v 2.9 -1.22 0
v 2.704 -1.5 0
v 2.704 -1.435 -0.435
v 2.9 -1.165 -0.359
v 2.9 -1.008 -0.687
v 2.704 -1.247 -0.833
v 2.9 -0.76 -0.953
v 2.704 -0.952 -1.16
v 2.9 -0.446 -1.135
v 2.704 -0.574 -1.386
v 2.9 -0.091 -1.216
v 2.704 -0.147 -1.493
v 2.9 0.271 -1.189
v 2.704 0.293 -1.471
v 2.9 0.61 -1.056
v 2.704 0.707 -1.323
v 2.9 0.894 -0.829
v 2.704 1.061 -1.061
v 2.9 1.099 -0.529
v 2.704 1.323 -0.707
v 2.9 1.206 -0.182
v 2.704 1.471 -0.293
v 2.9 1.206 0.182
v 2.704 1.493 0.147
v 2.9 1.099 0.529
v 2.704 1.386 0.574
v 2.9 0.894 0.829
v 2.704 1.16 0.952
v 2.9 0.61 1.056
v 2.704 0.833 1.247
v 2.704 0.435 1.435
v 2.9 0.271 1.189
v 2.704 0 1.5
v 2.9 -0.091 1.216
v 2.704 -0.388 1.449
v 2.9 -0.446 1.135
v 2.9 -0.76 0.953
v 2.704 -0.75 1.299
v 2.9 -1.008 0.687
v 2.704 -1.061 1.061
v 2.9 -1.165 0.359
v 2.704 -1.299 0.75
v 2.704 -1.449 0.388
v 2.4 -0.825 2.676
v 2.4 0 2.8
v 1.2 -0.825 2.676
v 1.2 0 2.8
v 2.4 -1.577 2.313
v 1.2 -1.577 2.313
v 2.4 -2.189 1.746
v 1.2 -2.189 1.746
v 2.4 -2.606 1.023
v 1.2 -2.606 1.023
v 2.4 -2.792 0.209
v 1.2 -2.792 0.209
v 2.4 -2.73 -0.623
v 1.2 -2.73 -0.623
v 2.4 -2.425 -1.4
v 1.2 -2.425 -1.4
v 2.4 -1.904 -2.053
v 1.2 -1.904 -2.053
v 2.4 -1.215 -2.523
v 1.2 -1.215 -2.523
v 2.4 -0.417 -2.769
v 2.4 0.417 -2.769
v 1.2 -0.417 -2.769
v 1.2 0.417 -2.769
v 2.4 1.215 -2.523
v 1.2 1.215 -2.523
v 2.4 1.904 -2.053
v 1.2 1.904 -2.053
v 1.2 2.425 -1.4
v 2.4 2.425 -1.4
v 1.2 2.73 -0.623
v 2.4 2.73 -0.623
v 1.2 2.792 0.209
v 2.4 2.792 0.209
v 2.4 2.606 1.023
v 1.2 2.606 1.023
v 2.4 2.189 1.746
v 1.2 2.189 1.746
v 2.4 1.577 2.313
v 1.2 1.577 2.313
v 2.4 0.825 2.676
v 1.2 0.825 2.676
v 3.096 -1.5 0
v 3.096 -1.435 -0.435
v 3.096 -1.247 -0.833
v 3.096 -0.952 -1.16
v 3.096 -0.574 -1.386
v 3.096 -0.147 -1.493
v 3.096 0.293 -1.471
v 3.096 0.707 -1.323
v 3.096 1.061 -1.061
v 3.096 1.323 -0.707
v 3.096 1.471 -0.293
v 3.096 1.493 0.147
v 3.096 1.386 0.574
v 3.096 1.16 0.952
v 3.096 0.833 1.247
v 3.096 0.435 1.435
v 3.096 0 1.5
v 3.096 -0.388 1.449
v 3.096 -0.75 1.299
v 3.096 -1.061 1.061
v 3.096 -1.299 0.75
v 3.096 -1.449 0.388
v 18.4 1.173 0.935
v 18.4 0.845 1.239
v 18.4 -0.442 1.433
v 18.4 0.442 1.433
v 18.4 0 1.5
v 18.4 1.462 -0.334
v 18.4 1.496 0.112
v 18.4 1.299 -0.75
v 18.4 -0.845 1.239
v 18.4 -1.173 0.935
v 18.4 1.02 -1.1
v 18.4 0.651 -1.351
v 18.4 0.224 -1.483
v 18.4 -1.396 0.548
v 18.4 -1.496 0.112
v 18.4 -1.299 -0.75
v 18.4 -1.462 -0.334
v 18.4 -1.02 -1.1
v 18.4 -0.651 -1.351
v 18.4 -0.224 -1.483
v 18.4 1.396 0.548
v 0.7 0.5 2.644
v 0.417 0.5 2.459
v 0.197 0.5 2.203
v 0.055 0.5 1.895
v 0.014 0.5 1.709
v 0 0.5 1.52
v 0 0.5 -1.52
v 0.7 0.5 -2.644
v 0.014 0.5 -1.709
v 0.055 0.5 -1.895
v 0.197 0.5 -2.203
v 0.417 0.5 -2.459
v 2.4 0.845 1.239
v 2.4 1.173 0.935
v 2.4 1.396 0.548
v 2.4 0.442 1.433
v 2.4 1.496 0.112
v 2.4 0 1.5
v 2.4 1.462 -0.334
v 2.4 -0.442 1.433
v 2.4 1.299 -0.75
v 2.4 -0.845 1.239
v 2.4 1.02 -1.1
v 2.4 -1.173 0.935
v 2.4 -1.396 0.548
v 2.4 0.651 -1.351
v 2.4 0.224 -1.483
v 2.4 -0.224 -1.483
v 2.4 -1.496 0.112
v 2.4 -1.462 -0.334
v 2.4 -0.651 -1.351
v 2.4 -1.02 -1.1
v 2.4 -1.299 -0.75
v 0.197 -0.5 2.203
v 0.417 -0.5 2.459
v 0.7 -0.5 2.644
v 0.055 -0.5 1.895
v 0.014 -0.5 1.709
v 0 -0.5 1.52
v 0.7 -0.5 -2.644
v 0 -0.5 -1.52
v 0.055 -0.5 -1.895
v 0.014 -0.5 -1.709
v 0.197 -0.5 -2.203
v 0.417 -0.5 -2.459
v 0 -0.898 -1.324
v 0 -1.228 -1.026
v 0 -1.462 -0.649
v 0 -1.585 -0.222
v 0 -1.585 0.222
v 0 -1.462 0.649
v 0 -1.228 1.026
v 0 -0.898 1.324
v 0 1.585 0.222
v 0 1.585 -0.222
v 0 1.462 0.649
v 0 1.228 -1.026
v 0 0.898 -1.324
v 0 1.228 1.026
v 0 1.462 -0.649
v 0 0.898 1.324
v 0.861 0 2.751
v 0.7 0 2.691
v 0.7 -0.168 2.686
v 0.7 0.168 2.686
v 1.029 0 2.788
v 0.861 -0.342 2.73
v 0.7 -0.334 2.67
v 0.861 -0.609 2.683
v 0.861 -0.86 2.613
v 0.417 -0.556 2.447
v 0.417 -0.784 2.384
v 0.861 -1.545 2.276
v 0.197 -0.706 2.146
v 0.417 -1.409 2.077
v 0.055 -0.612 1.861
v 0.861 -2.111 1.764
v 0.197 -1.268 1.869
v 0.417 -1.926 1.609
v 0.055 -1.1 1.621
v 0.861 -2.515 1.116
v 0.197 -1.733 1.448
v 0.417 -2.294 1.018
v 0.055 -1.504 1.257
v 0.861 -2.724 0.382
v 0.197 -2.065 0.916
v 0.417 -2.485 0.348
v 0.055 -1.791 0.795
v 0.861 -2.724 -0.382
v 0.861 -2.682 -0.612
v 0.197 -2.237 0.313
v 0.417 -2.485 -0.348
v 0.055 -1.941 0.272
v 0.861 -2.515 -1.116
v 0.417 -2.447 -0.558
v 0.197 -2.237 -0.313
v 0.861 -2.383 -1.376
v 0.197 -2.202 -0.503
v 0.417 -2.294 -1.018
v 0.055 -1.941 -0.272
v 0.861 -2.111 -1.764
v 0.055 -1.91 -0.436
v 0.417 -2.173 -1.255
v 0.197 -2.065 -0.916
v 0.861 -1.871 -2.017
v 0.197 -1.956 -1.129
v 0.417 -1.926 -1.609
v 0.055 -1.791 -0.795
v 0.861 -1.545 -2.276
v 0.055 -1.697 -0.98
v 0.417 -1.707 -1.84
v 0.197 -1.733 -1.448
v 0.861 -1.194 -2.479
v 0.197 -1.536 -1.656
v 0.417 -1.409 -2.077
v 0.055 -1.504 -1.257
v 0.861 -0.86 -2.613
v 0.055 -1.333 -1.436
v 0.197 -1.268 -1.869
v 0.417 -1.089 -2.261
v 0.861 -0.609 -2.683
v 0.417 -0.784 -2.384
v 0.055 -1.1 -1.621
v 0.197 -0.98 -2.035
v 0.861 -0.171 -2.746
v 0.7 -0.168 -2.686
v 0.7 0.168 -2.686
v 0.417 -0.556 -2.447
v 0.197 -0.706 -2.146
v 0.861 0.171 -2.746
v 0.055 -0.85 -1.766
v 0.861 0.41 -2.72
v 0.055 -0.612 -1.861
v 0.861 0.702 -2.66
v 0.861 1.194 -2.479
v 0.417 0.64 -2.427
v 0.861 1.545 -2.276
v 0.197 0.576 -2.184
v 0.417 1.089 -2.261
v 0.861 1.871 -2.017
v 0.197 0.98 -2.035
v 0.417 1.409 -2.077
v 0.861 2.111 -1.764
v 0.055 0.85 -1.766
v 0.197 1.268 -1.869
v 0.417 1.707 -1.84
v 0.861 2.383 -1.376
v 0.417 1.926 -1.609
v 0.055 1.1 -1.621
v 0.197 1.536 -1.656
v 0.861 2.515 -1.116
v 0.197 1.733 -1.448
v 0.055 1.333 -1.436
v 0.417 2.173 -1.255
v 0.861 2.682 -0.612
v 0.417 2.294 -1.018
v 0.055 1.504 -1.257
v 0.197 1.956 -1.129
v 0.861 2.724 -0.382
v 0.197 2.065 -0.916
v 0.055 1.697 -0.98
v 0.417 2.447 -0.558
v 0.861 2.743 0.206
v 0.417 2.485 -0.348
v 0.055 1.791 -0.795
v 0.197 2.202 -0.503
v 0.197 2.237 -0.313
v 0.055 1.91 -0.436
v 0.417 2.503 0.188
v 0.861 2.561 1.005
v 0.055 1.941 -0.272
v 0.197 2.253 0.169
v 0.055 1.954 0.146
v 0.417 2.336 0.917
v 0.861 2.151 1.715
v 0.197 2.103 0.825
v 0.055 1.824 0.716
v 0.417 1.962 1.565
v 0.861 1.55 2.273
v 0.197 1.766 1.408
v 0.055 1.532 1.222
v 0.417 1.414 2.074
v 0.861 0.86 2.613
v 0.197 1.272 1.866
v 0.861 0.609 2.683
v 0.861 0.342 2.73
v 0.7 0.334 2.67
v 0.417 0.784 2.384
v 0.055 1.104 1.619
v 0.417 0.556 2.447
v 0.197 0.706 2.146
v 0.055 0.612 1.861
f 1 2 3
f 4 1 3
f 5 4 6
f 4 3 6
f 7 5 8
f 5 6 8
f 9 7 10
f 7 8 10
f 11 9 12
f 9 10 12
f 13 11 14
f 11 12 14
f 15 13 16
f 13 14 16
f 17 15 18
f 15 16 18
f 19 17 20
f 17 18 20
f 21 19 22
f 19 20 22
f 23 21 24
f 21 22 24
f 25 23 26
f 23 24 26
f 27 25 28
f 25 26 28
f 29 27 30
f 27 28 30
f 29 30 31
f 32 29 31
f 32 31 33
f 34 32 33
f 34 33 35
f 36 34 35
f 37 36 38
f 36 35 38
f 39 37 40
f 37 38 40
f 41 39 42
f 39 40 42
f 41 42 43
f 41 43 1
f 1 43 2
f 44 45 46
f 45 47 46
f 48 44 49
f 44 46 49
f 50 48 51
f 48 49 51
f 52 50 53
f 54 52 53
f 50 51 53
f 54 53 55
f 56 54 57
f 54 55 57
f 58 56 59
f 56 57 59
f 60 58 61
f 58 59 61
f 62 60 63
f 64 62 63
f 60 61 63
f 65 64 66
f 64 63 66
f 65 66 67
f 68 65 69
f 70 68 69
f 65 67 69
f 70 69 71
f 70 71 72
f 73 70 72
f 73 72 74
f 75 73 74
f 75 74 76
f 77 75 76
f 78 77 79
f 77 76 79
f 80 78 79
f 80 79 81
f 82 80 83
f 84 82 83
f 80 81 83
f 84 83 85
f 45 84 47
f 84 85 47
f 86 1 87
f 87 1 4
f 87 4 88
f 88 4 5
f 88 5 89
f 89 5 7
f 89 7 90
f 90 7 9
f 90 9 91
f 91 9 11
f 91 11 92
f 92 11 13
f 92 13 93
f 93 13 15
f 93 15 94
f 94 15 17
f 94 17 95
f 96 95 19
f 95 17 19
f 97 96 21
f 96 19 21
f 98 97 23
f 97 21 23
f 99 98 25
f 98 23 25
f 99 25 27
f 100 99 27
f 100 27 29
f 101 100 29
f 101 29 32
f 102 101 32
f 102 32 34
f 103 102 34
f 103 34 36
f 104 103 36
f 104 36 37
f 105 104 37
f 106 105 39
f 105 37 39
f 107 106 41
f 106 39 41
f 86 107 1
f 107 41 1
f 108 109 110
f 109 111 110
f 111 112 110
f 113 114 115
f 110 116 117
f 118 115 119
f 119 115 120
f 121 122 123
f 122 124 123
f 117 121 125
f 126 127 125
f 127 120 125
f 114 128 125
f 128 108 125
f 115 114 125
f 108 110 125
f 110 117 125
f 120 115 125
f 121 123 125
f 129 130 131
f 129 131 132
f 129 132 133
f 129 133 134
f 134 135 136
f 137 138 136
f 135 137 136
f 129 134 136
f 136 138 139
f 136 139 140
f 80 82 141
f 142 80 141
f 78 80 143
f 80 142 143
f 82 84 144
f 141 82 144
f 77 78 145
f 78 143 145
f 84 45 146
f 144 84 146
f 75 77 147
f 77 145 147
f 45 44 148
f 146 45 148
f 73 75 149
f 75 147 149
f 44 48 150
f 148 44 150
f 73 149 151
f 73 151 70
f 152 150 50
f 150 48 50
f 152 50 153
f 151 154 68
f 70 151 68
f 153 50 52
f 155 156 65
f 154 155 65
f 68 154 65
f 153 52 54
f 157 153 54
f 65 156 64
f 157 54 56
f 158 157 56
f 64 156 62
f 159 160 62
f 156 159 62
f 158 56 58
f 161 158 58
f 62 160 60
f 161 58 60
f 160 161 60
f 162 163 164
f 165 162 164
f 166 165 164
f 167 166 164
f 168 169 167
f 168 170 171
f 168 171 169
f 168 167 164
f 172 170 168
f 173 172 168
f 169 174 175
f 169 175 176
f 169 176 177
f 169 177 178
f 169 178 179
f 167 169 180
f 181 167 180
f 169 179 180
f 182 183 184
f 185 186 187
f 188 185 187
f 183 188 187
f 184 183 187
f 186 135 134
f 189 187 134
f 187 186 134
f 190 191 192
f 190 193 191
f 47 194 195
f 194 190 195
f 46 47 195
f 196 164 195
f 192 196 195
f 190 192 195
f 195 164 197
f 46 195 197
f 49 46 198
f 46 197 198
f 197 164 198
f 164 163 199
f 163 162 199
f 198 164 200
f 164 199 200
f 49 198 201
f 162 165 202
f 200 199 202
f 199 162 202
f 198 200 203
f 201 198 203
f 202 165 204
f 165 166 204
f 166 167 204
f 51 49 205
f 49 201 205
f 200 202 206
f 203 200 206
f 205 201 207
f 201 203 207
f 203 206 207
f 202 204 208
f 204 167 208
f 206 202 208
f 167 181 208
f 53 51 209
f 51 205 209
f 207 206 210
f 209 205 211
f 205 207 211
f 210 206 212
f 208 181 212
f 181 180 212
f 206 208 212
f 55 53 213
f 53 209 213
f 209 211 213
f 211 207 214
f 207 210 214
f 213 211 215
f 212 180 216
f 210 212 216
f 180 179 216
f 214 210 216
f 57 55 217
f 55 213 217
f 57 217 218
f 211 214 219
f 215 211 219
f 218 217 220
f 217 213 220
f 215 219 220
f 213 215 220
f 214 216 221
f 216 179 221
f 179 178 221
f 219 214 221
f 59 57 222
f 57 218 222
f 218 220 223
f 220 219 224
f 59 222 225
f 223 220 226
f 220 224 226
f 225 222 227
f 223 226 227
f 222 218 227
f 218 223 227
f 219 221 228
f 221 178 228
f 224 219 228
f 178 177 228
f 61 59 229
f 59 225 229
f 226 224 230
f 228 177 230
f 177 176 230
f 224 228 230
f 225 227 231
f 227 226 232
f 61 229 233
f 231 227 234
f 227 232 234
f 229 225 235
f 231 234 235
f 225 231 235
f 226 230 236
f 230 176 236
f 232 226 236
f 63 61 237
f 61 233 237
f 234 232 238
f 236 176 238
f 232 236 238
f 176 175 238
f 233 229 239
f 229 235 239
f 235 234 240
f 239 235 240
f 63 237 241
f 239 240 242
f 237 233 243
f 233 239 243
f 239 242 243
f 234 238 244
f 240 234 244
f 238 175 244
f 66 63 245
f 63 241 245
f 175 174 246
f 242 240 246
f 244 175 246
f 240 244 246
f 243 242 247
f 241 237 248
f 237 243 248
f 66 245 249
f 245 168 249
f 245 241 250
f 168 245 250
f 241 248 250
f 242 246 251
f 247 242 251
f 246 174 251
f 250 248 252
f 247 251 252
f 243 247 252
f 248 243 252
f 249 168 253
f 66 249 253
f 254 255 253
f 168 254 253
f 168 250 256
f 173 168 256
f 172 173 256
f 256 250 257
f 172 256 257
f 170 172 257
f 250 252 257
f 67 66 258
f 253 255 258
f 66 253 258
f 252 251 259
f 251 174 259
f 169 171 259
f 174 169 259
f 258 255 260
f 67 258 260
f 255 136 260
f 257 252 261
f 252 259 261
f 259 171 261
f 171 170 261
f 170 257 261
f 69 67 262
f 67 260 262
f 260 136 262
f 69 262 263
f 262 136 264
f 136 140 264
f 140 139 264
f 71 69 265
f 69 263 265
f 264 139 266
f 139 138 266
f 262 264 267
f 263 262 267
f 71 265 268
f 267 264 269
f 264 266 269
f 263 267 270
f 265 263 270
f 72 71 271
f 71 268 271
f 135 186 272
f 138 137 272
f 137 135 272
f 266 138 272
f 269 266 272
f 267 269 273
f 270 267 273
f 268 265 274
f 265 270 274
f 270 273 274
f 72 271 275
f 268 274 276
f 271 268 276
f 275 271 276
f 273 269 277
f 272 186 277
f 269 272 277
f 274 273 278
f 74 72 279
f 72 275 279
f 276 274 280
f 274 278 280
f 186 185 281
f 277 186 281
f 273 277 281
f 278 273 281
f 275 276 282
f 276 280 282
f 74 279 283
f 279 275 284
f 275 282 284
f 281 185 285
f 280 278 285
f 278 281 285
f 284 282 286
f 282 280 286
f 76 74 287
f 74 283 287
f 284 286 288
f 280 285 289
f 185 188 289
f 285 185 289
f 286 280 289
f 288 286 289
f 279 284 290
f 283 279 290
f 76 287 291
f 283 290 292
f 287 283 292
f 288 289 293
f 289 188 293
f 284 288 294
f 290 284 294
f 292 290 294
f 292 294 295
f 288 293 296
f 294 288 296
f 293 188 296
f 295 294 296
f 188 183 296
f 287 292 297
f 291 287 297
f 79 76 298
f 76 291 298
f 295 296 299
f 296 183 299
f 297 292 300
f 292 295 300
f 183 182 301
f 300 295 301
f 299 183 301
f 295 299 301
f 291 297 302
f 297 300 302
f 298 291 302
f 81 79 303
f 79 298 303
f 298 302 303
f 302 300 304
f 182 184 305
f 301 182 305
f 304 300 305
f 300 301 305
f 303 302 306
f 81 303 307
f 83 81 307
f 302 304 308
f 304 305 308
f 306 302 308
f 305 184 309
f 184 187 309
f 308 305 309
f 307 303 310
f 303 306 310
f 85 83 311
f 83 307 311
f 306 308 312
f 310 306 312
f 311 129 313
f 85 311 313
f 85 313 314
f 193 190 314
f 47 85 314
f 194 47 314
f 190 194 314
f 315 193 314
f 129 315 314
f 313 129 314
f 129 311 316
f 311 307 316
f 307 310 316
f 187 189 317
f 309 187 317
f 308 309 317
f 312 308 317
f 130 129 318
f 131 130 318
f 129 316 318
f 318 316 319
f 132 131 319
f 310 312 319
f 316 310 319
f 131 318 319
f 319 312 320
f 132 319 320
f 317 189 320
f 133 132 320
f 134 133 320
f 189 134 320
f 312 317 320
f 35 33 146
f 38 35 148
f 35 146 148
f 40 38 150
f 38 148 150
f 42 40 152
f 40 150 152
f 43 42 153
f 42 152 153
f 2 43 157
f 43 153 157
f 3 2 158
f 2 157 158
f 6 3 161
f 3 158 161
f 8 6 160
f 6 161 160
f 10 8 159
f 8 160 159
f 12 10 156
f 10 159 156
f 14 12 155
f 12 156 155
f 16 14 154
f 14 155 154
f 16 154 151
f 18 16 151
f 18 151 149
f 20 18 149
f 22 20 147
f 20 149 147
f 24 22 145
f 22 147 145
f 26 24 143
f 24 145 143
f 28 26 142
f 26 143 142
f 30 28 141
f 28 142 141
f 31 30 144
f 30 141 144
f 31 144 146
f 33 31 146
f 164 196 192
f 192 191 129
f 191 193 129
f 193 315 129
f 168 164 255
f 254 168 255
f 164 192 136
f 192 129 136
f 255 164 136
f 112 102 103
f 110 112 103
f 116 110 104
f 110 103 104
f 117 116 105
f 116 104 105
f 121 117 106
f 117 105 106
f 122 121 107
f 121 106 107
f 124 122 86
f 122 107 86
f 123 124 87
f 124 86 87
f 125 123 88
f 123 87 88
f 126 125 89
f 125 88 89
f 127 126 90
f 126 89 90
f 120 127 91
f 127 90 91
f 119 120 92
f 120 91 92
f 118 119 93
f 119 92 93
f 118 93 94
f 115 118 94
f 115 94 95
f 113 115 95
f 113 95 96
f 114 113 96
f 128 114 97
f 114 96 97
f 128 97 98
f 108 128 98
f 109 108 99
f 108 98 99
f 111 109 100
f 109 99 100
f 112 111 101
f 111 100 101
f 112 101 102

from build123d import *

# Parameters (mm, degrees)
SKETCH2_W  = 5.6
SKETCH2_H  = 1
SLOT_DEPTH = 0.7


with BuildPart() as part:
    # BodySke → Base-Revolve (revolve)
    with BuildSketch(Plane.XY, mode=Mode.PRIVATE) as base_revolve_sk:
        with BuildLine():
            Line((2.4, 1.5), (2.4, 2.8))
            Line((2.4, 2.8), (1.2, 2.8))
            ThreePointArc((1.2, 2.8), (0.351471863, 2.448528137), (0, 1.6))
            Line((0, 1.6), (0, 0))
            Line((0, 0), (18.4, 0))
            Line((18.4, 0), (18.4, 1.5))
            Line((18.4, 1.5), (2.4, 1.5))
        make_face()
    revolve(base_revolve_sk.sketch.rotate(Axis((-25.4, 0, 0), (1, 0, 0)), 90), axis=Axis((-25.4, 0, 0), (1, 0, 0)))

    # Sketch2 → Slot (cut)
    with BuildSketch(Plane(origin=(0, 0, 0), x_dir=(0, 0, -1), z_dir=(1, 0, 0))):
        Rectangle(SKETCH2_W, SKETCH2_H)
    extrude(amount=SLOT_DEPTH, mode=Mode.SUBTRACT)

    # ThdSchSke → ThreadSchematic (revolve, cut)
    with BuildSketch(Plane.XY):
        Polygon((2.9, -1.2195), (2.703591786, -1.5), (2.703591786, -1.875), (3.096408214, -1.875), (3.096408214, -1.5), align=None)
    revolve(axis=Axis((-3.175, 0, 0), (1, 0, 0)), mode=Mode.SUBTRACT)


solid = part.part
